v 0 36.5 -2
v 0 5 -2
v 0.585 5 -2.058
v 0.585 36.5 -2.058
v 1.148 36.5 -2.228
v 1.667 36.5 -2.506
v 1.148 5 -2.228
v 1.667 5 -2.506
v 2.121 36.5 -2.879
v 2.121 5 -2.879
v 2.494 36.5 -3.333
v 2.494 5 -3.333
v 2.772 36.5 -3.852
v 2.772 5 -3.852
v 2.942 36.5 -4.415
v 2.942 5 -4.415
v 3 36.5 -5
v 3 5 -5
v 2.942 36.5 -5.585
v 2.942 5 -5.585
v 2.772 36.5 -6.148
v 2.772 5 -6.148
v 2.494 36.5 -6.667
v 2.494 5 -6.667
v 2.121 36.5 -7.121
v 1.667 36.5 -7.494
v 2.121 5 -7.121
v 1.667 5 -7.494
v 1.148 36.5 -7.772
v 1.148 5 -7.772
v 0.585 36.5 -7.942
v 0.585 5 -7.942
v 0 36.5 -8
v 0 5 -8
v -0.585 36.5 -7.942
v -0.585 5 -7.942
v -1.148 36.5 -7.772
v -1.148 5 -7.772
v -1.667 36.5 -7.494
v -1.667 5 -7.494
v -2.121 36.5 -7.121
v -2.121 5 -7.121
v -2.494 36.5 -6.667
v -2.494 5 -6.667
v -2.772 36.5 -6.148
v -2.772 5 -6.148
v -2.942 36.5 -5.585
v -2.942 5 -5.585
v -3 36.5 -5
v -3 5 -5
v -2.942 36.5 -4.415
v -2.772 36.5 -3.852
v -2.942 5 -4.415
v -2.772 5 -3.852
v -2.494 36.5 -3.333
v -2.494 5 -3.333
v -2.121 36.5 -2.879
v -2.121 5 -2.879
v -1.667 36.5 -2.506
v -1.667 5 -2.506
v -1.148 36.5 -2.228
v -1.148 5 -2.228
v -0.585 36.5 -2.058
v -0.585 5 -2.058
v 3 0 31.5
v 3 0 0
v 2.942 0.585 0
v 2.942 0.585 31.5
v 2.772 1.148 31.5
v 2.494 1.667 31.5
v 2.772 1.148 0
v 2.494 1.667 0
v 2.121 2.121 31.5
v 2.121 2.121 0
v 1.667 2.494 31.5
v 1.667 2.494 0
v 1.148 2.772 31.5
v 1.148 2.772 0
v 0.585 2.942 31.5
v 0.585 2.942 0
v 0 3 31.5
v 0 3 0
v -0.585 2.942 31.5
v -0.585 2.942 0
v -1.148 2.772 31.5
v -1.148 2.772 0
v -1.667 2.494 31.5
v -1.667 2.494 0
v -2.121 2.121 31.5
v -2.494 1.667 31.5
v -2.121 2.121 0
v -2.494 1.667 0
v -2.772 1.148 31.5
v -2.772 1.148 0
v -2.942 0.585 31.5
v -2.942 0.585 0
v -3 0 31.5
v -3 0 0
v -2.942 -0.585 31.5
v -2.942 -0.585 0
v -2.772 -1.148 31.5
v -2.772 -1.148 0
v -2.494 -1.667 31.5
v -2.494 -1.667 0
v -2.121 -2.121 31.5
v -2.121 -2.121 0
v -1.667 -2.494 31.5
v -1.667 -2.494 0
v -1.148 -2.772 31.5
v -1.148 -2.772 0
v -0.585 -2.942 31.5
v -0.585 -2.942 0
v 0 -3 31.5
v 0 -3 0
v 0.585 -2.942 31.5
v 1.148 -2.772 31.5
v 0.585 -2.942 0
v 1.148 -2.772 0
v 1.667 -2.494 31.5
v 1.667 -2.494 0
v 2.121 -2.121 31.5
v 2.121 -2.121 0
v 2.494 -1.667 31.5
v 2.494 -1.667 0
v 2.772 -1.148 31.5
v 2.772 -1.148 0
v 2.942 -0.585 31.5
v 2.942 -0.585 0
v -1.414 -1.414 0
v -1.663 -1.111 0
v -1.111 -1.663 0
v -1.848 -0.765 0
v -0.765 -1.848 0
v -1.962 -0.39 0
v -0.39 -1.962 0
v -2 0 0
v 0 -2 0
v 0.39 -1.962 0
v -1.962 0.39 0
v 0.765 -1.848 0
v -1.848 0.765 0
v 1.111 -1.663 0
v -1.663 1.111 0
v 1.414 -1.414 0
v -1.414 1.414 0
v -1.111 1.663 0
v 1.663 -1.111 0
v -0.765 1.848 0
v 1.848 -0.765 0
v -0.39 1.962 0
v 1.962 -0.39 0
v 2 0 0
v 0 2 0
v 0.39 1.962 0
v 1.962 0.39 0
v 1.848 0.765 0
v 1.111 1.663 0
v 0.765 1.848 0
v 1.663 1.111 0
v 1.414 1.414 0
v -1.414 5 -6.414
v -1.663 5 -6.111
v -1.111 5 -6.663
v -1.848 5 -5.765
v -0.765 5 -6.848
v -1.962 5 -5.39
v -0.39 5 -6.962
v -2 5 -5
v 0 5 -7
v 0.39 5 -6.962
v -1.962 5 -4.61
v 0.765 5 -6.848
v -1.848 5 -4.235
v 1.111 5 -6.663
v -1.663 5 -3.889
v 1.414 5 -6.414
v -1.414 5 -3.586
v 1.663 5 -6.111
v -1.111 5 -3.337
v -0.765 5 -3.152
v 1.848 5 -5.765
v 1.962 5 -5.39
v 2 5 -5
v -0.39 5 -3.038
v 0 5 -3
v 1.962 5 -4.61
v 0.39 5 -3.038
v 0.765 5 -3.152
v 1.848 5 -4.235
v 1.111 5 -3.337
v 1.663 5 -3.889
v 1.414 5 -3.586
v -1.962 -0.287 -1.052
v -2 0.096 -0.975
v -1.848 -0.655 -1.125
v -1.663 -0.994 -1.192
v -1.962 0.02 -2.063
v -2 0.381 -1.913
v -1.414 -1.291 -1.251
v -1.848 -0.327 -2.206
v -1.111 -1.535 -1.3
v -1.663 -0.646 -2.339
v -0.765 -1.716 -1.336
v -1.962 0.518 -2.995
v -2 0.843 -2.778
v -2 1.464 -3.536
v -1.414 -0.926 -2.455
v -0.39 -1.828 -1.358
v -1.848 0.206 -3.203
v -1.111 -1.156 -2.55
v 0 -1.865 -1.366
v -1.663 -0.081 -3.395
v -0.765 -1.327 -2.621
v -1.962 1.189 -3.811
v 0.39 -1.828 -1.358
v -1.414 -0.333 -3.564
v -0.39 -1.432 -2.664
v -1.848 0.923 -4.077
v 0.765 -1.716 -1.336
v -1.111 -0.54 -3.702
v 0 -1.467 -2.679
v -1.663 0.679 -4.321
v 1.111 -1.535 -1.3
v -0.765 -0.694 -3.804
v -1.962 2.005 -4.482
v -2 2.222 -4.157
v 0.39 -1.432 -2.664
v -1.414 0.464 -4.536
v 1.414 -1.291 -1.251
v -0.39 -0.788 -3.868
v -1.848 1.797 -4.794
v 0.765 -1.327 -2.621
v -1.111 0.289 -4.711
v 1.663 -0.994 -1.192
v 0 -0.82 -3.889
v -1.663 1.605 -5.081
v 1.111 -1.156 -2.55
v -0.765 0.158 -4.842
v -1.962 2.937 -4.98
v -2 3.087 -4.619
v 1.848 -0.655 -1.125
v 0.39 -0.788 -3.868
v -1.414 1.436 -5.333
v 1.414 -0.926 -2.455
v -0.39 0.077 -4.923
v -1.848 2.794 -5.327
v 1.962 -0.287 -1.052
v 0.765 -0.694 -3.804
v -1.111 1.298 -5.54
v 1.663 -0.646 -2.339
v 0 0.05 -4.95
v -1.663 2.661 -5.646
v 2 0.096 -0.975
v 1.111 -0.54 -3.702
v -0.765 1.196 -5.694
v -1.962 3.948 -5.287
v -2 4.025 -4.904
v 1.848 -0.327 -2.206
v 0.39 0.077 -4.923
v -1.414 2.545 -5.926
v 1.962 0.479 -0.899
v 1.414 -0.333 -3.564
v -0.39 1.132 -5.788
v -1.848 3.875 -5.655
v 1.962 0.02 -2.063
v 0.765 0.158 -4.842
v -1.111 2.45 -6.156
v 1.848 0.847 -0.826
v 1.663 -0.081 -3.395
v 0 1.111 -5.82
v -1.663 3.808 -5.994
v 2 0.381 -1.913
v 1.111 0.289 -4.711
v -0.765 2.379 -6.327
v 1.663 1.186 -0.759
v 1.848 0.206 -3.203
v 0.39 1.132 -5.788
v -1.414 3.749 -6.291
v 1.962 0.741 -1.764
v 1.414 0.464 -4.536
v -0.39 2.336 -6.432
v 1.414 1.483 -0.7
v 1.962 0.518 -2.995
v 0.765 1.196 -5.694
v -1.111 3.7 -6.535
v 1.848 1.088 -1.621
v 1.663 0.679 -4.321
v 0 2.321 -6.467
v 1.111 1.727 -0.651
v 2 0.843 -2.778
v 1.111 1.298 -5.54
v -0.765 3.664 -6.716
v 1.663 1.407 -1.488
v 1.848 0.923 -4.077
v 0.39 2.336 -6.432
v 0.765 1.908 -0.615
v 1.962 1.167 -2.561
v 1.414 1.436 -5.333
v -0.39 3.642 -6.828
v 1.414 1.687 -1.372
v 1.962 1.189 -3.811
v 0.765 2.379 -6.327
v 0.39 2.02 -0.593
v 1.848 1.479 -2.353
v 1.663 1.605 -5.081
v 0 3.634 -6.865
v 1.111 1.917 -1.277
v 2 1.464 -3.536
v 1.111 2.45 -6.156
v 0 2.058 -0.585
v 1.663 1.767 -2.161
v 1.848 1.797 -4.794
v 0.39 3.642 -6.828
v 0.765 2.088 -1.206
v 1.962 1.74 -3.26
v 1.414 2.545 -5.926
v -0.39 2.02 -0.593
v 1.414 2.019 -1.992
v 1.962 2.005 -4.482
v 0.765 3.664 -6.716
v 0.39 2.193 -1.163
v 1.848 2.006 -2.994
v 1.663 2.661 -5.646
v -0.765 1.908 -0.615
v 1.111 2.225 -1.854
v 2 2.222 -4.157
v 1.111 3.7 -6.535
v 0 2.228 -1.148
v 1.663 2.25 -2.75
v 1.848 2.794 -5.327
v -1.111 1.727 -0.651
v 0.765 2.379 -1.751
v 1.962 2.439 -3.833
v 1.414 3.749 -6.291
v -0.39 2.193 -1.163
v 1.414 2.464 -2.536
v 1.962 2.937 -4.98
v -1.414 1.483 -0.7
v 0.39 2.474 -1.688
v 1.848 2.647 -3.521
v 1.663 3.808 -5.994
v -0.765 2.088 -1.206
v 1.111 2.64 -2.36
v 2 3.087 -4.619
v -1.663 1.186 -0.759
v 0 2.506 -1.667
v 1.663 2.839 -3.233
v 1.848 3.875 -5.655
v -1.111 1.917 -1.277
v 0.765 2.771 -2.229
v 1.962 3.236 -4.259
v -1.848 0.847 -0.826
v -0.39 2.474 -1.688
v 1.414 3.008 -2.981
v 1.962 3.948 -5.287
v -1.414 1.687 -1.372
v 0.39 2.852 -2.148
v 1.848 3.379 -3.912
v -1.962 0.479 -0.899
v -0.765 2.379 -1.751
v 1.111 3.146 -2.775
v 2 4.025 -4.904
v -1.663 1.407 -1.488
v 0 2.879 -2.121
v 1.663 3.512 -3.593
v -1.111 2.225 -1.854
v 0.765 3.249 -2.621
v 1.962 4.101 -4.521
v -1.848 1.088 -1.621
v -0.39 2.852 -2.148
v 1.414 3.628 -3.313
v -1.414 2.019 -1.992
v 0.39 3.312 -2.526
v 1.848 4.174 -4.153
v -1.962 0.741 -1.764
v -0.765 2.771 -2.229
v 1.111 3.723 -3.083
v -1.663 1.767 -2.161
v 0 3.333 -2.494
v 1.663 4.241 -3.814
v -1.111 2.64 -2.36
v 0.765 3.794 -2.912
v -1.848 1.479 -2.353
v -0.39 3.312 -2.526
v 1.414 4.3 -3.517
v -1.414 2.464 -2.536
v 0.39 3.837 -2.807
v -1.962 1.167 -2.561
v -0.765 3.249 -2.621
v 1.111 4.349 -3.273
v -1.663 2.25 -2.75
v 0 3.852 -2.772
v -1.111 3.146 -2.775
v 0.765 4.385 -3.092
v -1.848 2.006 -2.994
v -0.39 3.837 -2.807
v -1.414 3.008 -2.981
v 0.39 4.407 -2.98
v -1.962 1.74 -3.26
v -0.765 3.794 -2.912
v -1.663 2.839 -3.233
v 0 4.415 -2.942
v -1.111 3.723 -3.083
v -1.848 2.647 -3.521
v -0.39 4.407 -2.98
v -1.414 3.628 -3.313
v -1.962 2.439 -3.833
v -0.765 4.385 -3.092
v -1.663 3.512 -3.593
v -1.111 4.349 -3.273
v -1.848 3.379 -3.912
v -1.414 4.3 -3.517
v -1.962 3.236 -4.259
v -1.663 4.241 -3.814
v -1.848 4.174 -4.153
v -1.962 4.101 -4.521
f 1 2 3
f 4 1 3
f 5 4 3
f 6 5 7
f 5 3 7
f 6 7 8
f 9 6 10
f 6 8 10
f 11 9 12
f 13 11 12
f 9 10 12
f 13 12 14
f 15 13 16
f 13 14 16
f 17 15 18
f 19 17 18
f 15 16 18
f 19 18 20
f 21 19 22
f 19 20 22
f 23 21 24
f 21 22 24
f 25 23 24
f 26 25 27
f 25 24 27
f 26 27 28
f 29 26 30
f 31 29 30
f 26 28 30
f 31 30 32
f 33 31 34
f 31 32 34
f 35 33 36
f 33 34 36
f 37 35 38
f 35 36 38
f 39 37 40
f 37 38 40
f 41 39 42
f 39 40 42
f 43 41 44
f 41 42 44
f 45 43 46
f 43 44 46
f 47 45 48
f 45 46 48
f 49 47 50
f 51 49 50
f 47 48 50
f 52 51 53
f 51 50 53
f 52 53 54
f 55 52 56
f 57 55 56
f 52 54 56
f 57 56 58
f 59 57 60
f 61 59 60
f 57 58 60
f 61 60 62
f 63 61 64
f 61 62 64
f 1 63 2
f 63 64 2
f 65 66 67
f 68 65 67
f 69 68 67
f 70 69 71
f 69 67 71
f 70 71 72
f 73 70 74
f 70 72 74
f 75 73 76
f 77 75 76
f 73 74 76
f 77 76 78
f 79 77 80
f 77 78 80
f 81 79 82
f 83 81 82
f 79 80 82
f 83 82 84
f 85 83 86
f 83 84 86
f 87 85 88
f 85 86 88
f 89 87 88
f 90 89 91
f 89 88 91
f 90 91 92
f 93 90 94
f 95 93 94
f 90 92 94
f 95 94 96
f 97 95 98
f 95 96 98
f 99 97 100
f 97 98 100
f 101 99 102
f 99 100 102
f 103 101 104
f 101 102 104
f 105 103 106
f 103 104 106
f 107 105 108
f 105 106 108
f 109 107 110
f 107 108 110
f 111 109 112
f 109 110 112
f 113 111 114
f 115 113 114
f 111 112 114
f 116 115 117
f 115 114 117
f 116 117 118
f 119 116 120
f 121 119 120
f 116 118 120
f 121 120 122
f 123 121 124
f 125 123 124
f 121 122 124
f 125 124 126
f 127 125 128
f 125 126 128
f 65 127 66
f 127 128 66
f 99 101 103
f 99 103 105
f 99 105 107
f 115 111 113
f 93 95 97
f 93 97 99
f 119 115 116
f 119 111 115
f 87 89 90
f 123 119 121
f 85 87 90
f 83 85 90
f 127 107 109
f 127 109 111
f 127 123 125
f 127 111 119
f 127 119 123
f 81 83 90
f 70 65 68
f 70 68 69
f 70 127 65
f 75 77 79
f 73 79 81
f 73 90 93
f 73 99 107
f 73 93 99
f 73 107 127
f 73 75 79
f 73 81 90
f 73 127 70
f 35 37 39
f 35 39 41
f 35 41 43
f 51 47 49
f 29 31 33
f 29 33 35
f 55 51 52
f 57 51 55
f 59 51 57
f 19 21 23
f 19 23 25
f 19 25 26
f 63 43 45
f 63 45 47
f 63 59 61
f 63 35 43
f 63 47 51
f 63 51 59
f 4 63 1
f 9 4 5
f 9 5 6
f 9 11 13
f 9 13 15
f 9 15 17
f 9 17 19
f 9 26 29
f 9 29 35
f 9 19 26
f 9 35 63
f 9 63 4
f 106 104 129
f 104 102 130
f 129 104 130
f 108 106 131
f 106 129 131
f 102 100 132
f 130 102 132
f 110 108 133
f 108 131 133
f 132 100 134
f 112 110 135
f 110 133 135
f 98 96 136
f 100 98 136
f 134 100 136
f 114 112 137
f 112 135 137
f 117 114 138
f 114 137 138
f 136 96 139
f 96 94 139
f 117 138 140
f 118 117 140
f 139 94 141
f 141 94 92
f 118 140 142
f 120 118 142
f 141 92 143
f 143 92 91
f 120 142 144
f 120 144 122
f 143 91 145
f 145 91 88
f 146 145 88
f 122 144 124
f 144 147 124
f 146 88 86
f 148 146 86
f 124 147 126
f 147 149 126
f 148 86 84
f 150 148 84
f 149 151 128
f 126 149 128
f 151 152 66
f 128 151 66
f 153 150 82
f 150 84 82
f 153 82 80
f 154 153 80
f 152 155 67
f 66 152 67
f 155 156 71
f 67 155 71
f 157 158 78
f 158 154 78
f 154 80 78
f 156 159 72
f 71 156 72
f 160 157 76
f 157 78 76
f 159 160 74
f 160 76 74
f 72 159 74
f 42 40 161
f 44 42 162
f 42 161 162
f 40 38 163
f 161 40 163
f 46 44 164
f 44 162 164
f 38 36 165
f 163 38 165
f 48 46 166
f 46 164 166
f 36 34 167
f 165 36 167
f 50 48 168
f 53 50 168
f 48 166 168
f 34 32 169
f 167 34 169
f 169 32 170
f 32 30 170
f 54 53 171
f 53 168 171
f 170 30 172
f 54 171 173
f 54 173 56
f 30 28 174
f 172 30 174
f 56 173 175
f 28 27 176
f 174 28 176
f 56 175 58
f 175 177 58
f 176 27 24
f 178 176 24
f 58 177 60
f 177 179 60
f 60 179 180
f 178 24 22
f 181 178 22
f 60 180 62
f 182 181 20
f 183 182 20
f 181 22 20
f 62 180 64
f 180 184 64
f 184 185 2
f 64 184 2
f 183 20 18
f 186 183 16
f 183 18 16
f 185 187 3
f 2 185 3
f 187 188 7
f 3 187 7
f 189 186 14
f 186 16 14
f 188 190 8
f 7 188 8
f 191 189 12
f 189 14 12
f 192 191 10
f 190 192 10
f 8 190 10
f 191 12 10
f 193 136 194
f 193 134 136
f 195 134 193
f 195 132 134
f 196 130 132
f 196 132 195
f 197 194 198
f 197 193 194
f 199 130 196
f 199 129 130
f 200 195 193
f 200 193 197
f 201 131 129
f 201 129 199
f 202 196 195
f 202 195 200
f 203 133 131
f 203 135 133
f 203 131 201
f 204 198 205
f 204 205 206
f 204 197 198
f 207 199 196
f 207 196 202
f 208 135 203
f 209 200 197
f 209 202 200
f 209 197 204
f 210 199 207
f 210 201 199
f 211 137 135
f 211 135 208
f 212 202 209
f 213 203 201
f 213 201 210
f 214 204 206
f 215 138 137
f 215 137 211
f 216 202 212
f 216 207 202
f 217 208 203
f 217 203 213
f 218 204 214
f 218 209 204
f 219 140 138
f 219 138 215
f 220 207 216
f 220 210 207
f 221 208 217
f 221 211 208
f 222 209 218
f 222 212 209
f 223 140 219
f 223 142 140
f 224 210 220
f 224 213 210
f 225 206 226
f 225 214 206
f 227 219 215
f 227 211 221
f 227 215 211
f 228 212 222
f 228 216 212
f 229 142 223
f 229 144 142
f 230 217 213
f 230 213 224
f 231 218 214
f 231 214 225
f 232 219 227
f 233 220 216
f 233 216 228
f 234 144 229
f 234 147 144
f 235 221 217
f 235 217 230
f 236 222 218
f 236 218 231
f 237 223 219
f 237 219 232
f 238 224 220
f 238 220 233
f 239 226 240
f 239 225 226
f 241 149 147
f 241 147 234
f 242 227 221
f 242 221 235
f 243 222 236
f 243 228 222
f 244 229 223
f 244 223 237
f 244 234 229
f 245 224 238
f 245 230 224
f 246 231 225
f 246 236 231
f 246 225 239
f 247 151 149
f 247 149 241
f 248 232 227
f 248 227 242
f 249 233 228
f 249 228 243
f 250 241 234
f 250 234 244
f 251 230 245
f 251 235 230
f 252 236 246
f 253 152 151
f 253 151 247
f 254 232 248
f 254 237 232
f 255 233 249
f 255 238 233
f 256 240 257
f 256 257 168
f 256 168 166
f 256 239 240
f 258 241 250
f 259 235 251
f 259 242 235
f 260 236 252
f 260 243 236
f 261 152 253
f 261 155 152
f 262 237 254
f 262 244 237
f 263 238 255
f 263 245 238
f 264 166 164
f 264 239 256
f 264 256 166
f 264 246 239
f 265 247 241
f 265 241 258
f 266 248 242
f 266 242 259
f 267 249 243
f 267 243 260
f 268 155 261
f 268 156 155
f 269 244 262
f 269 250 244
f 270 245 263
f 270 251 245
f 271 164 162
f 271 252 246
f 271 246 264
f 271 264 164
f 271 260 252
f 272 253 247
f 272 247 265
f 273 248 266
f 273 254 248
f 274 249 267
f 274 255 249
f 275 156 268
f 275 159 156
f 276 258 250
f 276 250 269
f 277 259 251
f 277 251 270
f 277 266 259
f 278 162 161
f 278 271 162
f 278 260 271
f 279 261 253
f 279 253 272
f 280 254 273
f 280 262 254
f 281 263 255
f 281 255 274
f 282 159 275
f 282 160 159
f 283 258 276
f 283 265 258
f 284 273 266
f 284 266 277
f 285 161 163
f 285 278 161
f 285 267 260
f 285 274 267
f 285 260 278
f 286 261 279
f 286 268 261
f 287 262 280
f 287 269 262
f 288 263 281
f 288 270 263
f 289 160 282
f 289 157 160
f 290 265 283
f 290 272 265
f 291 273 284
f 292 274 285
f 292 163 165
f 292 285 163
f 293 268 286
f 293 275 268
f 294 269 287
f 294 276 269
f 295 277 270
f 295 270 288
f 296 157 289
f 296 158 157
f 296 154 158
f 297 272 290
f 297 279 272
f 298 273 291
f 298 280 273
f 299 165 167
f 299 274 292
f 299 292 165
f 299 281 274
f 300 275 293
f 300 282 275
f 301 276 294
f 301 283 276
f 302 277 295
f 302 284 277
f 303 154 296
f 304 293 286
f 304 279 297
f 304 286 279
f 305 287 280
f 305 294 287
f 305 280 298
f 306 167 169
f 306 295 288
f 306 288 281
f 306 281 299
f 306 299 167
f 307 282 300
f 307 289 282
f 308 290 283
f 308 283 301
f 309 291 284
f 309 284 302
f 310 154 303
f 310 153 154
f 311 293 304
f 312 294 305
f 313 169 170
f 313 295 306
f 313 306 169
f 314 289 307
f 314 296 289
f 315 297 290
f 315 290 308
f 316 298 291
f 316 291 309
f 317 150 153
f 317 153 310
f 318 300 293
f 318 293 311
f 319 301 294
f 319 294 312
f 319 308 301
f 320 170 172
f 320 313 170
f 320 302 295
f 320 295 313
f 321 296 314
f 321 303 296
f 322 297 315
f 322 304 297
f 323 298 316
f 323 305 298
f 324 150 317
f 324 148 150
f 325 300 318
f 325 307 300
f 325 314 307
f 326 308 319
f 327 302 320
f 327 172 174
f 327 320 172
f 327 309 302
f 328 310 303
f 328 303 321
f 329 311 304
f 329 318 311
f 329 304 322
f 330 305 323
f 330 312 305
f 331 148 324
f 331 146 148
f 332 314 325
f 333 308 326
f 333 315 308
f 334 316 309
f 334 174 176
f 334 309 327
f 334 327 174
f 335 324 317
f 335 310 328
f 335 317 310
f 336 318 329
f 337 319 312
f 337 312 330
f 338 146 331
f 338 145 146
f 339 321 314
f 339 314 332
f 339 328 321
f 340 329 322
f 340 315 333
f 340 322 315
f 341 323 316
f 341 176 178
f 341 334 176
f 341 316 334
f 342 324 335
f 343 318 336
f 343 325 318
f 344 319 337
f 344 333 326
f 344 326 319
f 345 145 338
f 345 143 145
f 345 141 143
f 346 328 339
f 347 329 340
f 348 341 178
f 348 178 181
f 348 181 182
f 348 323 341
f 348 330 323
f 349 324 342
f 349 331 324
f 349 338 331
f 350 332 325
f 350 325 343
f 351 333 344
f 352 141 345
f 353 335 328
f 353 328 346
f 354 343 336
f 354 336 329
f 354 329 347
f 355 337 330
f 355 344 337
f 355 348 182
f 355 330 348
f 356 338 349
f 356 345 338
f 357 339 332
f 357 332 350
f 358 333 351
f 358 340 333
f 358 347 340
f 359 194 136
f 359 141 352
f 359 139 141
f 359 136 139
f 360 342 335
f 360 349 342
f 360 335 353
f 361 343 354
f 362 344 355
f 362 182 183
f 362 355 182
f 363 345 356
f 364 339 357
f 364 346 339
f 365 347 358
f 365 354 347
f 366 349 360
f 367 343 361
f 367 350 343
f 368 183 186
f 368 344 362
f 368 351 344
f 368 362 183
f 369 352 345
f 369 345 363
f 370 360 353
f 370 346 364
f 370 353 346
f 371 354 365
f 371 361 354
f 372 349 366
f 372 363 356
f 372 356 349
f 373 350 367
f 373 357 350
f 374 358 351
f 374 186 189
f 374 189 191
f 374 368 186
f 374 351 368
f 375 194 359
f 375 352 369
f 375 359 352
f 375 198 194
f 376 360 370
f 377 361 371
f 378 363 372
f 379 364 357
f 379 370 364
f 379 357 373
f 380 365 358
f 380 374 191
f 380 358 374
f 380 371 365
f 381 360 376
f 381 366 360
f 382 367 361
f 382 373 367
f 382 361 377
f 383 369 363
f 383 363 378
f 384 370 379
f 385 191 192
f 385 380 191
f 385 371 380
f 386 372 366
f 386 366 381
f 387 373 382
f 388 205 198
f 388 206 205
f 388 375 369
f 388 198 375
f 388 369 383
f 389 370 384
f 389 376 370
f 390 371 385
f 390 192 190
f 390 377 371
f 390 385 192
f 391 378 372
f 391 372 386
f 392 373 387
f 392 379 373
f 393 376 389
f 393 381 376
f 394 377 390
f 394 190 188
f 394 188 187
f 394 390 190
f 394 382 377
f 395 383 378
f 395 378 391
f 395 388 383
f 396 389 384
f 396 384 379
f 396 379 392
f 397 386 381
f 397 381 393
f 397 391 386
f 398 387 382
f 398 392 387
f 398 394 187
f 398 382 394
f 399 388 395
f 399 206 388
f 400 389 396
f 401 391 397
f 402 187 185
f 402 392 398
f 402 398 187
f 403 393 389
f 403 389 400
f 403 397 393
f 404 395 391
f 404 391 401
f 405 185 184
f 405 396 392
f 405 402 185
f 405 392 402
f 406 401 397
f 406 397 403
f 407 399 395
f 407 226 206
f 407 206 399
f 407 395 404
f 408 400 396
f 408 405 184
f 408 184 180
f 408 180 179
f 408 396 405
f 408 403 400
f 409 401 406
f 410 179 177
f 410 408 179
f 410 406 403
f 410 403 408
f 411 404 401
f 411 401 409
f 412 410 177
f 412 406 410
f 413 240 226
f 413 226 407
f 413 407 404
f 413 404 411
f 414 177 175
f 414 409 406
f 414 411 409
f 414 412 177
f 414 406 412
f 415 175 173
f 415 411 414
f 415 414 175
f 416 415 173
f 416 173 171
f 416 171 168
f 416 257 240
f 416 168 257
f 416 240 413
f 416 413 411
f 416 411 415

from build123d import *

# Parameters (mm, degrees)
SKETCH1_R           = 3
BOSS_EXTRUDE1_DEPTH = 31.5
SKETCH4_R           = 2
SKETCH9_R           = 3
BOSS_EXTRUDE2_DEPTH = 31.5


with BuildPart() as part:
    # Sketch1 → Boss-Extrude1 (new body)
    with BuildSketch(Plane.XY):
        Circle(SKETCH1_R)
    extrude(amount=BOSS_EXTRUDE1_DEPTH)

    # Sweep1: sweep along a path in Sketch5
    with BuildLine(Plane(origin=(0, 0, 0), x_dir=(0, 0, -1), z_dir=(1, 0, 0))) as sweep1_path:
        ThreePointArc((0, 0), (3.535533906, 1.464466094), (5, 5))
    # Sketch4 → Sweep1 (sweep)
    with BuildSketch(Plane(origin=(0, 0, 0), x_dir=(-1, 0, 0), z_dir=(0, 0, -1))):
        Circle(SKETCH4_R)
    sweep(path=sweep1_path.line)

    # Sketch9 → Boss-Extrude2 (add)
    with BuildSketch(Plane(origin=(0, 5, 0), x_dir=(1, 0, 0), z_dir=(0, 1, 0))):
        with Locations(Location((0, 5, 0), (0, 0, 270))):
            Circle(SKETCH9_R)
    extrude(amount=BOSS_EXTRUDE2_DEPTH)


solid = part.part
